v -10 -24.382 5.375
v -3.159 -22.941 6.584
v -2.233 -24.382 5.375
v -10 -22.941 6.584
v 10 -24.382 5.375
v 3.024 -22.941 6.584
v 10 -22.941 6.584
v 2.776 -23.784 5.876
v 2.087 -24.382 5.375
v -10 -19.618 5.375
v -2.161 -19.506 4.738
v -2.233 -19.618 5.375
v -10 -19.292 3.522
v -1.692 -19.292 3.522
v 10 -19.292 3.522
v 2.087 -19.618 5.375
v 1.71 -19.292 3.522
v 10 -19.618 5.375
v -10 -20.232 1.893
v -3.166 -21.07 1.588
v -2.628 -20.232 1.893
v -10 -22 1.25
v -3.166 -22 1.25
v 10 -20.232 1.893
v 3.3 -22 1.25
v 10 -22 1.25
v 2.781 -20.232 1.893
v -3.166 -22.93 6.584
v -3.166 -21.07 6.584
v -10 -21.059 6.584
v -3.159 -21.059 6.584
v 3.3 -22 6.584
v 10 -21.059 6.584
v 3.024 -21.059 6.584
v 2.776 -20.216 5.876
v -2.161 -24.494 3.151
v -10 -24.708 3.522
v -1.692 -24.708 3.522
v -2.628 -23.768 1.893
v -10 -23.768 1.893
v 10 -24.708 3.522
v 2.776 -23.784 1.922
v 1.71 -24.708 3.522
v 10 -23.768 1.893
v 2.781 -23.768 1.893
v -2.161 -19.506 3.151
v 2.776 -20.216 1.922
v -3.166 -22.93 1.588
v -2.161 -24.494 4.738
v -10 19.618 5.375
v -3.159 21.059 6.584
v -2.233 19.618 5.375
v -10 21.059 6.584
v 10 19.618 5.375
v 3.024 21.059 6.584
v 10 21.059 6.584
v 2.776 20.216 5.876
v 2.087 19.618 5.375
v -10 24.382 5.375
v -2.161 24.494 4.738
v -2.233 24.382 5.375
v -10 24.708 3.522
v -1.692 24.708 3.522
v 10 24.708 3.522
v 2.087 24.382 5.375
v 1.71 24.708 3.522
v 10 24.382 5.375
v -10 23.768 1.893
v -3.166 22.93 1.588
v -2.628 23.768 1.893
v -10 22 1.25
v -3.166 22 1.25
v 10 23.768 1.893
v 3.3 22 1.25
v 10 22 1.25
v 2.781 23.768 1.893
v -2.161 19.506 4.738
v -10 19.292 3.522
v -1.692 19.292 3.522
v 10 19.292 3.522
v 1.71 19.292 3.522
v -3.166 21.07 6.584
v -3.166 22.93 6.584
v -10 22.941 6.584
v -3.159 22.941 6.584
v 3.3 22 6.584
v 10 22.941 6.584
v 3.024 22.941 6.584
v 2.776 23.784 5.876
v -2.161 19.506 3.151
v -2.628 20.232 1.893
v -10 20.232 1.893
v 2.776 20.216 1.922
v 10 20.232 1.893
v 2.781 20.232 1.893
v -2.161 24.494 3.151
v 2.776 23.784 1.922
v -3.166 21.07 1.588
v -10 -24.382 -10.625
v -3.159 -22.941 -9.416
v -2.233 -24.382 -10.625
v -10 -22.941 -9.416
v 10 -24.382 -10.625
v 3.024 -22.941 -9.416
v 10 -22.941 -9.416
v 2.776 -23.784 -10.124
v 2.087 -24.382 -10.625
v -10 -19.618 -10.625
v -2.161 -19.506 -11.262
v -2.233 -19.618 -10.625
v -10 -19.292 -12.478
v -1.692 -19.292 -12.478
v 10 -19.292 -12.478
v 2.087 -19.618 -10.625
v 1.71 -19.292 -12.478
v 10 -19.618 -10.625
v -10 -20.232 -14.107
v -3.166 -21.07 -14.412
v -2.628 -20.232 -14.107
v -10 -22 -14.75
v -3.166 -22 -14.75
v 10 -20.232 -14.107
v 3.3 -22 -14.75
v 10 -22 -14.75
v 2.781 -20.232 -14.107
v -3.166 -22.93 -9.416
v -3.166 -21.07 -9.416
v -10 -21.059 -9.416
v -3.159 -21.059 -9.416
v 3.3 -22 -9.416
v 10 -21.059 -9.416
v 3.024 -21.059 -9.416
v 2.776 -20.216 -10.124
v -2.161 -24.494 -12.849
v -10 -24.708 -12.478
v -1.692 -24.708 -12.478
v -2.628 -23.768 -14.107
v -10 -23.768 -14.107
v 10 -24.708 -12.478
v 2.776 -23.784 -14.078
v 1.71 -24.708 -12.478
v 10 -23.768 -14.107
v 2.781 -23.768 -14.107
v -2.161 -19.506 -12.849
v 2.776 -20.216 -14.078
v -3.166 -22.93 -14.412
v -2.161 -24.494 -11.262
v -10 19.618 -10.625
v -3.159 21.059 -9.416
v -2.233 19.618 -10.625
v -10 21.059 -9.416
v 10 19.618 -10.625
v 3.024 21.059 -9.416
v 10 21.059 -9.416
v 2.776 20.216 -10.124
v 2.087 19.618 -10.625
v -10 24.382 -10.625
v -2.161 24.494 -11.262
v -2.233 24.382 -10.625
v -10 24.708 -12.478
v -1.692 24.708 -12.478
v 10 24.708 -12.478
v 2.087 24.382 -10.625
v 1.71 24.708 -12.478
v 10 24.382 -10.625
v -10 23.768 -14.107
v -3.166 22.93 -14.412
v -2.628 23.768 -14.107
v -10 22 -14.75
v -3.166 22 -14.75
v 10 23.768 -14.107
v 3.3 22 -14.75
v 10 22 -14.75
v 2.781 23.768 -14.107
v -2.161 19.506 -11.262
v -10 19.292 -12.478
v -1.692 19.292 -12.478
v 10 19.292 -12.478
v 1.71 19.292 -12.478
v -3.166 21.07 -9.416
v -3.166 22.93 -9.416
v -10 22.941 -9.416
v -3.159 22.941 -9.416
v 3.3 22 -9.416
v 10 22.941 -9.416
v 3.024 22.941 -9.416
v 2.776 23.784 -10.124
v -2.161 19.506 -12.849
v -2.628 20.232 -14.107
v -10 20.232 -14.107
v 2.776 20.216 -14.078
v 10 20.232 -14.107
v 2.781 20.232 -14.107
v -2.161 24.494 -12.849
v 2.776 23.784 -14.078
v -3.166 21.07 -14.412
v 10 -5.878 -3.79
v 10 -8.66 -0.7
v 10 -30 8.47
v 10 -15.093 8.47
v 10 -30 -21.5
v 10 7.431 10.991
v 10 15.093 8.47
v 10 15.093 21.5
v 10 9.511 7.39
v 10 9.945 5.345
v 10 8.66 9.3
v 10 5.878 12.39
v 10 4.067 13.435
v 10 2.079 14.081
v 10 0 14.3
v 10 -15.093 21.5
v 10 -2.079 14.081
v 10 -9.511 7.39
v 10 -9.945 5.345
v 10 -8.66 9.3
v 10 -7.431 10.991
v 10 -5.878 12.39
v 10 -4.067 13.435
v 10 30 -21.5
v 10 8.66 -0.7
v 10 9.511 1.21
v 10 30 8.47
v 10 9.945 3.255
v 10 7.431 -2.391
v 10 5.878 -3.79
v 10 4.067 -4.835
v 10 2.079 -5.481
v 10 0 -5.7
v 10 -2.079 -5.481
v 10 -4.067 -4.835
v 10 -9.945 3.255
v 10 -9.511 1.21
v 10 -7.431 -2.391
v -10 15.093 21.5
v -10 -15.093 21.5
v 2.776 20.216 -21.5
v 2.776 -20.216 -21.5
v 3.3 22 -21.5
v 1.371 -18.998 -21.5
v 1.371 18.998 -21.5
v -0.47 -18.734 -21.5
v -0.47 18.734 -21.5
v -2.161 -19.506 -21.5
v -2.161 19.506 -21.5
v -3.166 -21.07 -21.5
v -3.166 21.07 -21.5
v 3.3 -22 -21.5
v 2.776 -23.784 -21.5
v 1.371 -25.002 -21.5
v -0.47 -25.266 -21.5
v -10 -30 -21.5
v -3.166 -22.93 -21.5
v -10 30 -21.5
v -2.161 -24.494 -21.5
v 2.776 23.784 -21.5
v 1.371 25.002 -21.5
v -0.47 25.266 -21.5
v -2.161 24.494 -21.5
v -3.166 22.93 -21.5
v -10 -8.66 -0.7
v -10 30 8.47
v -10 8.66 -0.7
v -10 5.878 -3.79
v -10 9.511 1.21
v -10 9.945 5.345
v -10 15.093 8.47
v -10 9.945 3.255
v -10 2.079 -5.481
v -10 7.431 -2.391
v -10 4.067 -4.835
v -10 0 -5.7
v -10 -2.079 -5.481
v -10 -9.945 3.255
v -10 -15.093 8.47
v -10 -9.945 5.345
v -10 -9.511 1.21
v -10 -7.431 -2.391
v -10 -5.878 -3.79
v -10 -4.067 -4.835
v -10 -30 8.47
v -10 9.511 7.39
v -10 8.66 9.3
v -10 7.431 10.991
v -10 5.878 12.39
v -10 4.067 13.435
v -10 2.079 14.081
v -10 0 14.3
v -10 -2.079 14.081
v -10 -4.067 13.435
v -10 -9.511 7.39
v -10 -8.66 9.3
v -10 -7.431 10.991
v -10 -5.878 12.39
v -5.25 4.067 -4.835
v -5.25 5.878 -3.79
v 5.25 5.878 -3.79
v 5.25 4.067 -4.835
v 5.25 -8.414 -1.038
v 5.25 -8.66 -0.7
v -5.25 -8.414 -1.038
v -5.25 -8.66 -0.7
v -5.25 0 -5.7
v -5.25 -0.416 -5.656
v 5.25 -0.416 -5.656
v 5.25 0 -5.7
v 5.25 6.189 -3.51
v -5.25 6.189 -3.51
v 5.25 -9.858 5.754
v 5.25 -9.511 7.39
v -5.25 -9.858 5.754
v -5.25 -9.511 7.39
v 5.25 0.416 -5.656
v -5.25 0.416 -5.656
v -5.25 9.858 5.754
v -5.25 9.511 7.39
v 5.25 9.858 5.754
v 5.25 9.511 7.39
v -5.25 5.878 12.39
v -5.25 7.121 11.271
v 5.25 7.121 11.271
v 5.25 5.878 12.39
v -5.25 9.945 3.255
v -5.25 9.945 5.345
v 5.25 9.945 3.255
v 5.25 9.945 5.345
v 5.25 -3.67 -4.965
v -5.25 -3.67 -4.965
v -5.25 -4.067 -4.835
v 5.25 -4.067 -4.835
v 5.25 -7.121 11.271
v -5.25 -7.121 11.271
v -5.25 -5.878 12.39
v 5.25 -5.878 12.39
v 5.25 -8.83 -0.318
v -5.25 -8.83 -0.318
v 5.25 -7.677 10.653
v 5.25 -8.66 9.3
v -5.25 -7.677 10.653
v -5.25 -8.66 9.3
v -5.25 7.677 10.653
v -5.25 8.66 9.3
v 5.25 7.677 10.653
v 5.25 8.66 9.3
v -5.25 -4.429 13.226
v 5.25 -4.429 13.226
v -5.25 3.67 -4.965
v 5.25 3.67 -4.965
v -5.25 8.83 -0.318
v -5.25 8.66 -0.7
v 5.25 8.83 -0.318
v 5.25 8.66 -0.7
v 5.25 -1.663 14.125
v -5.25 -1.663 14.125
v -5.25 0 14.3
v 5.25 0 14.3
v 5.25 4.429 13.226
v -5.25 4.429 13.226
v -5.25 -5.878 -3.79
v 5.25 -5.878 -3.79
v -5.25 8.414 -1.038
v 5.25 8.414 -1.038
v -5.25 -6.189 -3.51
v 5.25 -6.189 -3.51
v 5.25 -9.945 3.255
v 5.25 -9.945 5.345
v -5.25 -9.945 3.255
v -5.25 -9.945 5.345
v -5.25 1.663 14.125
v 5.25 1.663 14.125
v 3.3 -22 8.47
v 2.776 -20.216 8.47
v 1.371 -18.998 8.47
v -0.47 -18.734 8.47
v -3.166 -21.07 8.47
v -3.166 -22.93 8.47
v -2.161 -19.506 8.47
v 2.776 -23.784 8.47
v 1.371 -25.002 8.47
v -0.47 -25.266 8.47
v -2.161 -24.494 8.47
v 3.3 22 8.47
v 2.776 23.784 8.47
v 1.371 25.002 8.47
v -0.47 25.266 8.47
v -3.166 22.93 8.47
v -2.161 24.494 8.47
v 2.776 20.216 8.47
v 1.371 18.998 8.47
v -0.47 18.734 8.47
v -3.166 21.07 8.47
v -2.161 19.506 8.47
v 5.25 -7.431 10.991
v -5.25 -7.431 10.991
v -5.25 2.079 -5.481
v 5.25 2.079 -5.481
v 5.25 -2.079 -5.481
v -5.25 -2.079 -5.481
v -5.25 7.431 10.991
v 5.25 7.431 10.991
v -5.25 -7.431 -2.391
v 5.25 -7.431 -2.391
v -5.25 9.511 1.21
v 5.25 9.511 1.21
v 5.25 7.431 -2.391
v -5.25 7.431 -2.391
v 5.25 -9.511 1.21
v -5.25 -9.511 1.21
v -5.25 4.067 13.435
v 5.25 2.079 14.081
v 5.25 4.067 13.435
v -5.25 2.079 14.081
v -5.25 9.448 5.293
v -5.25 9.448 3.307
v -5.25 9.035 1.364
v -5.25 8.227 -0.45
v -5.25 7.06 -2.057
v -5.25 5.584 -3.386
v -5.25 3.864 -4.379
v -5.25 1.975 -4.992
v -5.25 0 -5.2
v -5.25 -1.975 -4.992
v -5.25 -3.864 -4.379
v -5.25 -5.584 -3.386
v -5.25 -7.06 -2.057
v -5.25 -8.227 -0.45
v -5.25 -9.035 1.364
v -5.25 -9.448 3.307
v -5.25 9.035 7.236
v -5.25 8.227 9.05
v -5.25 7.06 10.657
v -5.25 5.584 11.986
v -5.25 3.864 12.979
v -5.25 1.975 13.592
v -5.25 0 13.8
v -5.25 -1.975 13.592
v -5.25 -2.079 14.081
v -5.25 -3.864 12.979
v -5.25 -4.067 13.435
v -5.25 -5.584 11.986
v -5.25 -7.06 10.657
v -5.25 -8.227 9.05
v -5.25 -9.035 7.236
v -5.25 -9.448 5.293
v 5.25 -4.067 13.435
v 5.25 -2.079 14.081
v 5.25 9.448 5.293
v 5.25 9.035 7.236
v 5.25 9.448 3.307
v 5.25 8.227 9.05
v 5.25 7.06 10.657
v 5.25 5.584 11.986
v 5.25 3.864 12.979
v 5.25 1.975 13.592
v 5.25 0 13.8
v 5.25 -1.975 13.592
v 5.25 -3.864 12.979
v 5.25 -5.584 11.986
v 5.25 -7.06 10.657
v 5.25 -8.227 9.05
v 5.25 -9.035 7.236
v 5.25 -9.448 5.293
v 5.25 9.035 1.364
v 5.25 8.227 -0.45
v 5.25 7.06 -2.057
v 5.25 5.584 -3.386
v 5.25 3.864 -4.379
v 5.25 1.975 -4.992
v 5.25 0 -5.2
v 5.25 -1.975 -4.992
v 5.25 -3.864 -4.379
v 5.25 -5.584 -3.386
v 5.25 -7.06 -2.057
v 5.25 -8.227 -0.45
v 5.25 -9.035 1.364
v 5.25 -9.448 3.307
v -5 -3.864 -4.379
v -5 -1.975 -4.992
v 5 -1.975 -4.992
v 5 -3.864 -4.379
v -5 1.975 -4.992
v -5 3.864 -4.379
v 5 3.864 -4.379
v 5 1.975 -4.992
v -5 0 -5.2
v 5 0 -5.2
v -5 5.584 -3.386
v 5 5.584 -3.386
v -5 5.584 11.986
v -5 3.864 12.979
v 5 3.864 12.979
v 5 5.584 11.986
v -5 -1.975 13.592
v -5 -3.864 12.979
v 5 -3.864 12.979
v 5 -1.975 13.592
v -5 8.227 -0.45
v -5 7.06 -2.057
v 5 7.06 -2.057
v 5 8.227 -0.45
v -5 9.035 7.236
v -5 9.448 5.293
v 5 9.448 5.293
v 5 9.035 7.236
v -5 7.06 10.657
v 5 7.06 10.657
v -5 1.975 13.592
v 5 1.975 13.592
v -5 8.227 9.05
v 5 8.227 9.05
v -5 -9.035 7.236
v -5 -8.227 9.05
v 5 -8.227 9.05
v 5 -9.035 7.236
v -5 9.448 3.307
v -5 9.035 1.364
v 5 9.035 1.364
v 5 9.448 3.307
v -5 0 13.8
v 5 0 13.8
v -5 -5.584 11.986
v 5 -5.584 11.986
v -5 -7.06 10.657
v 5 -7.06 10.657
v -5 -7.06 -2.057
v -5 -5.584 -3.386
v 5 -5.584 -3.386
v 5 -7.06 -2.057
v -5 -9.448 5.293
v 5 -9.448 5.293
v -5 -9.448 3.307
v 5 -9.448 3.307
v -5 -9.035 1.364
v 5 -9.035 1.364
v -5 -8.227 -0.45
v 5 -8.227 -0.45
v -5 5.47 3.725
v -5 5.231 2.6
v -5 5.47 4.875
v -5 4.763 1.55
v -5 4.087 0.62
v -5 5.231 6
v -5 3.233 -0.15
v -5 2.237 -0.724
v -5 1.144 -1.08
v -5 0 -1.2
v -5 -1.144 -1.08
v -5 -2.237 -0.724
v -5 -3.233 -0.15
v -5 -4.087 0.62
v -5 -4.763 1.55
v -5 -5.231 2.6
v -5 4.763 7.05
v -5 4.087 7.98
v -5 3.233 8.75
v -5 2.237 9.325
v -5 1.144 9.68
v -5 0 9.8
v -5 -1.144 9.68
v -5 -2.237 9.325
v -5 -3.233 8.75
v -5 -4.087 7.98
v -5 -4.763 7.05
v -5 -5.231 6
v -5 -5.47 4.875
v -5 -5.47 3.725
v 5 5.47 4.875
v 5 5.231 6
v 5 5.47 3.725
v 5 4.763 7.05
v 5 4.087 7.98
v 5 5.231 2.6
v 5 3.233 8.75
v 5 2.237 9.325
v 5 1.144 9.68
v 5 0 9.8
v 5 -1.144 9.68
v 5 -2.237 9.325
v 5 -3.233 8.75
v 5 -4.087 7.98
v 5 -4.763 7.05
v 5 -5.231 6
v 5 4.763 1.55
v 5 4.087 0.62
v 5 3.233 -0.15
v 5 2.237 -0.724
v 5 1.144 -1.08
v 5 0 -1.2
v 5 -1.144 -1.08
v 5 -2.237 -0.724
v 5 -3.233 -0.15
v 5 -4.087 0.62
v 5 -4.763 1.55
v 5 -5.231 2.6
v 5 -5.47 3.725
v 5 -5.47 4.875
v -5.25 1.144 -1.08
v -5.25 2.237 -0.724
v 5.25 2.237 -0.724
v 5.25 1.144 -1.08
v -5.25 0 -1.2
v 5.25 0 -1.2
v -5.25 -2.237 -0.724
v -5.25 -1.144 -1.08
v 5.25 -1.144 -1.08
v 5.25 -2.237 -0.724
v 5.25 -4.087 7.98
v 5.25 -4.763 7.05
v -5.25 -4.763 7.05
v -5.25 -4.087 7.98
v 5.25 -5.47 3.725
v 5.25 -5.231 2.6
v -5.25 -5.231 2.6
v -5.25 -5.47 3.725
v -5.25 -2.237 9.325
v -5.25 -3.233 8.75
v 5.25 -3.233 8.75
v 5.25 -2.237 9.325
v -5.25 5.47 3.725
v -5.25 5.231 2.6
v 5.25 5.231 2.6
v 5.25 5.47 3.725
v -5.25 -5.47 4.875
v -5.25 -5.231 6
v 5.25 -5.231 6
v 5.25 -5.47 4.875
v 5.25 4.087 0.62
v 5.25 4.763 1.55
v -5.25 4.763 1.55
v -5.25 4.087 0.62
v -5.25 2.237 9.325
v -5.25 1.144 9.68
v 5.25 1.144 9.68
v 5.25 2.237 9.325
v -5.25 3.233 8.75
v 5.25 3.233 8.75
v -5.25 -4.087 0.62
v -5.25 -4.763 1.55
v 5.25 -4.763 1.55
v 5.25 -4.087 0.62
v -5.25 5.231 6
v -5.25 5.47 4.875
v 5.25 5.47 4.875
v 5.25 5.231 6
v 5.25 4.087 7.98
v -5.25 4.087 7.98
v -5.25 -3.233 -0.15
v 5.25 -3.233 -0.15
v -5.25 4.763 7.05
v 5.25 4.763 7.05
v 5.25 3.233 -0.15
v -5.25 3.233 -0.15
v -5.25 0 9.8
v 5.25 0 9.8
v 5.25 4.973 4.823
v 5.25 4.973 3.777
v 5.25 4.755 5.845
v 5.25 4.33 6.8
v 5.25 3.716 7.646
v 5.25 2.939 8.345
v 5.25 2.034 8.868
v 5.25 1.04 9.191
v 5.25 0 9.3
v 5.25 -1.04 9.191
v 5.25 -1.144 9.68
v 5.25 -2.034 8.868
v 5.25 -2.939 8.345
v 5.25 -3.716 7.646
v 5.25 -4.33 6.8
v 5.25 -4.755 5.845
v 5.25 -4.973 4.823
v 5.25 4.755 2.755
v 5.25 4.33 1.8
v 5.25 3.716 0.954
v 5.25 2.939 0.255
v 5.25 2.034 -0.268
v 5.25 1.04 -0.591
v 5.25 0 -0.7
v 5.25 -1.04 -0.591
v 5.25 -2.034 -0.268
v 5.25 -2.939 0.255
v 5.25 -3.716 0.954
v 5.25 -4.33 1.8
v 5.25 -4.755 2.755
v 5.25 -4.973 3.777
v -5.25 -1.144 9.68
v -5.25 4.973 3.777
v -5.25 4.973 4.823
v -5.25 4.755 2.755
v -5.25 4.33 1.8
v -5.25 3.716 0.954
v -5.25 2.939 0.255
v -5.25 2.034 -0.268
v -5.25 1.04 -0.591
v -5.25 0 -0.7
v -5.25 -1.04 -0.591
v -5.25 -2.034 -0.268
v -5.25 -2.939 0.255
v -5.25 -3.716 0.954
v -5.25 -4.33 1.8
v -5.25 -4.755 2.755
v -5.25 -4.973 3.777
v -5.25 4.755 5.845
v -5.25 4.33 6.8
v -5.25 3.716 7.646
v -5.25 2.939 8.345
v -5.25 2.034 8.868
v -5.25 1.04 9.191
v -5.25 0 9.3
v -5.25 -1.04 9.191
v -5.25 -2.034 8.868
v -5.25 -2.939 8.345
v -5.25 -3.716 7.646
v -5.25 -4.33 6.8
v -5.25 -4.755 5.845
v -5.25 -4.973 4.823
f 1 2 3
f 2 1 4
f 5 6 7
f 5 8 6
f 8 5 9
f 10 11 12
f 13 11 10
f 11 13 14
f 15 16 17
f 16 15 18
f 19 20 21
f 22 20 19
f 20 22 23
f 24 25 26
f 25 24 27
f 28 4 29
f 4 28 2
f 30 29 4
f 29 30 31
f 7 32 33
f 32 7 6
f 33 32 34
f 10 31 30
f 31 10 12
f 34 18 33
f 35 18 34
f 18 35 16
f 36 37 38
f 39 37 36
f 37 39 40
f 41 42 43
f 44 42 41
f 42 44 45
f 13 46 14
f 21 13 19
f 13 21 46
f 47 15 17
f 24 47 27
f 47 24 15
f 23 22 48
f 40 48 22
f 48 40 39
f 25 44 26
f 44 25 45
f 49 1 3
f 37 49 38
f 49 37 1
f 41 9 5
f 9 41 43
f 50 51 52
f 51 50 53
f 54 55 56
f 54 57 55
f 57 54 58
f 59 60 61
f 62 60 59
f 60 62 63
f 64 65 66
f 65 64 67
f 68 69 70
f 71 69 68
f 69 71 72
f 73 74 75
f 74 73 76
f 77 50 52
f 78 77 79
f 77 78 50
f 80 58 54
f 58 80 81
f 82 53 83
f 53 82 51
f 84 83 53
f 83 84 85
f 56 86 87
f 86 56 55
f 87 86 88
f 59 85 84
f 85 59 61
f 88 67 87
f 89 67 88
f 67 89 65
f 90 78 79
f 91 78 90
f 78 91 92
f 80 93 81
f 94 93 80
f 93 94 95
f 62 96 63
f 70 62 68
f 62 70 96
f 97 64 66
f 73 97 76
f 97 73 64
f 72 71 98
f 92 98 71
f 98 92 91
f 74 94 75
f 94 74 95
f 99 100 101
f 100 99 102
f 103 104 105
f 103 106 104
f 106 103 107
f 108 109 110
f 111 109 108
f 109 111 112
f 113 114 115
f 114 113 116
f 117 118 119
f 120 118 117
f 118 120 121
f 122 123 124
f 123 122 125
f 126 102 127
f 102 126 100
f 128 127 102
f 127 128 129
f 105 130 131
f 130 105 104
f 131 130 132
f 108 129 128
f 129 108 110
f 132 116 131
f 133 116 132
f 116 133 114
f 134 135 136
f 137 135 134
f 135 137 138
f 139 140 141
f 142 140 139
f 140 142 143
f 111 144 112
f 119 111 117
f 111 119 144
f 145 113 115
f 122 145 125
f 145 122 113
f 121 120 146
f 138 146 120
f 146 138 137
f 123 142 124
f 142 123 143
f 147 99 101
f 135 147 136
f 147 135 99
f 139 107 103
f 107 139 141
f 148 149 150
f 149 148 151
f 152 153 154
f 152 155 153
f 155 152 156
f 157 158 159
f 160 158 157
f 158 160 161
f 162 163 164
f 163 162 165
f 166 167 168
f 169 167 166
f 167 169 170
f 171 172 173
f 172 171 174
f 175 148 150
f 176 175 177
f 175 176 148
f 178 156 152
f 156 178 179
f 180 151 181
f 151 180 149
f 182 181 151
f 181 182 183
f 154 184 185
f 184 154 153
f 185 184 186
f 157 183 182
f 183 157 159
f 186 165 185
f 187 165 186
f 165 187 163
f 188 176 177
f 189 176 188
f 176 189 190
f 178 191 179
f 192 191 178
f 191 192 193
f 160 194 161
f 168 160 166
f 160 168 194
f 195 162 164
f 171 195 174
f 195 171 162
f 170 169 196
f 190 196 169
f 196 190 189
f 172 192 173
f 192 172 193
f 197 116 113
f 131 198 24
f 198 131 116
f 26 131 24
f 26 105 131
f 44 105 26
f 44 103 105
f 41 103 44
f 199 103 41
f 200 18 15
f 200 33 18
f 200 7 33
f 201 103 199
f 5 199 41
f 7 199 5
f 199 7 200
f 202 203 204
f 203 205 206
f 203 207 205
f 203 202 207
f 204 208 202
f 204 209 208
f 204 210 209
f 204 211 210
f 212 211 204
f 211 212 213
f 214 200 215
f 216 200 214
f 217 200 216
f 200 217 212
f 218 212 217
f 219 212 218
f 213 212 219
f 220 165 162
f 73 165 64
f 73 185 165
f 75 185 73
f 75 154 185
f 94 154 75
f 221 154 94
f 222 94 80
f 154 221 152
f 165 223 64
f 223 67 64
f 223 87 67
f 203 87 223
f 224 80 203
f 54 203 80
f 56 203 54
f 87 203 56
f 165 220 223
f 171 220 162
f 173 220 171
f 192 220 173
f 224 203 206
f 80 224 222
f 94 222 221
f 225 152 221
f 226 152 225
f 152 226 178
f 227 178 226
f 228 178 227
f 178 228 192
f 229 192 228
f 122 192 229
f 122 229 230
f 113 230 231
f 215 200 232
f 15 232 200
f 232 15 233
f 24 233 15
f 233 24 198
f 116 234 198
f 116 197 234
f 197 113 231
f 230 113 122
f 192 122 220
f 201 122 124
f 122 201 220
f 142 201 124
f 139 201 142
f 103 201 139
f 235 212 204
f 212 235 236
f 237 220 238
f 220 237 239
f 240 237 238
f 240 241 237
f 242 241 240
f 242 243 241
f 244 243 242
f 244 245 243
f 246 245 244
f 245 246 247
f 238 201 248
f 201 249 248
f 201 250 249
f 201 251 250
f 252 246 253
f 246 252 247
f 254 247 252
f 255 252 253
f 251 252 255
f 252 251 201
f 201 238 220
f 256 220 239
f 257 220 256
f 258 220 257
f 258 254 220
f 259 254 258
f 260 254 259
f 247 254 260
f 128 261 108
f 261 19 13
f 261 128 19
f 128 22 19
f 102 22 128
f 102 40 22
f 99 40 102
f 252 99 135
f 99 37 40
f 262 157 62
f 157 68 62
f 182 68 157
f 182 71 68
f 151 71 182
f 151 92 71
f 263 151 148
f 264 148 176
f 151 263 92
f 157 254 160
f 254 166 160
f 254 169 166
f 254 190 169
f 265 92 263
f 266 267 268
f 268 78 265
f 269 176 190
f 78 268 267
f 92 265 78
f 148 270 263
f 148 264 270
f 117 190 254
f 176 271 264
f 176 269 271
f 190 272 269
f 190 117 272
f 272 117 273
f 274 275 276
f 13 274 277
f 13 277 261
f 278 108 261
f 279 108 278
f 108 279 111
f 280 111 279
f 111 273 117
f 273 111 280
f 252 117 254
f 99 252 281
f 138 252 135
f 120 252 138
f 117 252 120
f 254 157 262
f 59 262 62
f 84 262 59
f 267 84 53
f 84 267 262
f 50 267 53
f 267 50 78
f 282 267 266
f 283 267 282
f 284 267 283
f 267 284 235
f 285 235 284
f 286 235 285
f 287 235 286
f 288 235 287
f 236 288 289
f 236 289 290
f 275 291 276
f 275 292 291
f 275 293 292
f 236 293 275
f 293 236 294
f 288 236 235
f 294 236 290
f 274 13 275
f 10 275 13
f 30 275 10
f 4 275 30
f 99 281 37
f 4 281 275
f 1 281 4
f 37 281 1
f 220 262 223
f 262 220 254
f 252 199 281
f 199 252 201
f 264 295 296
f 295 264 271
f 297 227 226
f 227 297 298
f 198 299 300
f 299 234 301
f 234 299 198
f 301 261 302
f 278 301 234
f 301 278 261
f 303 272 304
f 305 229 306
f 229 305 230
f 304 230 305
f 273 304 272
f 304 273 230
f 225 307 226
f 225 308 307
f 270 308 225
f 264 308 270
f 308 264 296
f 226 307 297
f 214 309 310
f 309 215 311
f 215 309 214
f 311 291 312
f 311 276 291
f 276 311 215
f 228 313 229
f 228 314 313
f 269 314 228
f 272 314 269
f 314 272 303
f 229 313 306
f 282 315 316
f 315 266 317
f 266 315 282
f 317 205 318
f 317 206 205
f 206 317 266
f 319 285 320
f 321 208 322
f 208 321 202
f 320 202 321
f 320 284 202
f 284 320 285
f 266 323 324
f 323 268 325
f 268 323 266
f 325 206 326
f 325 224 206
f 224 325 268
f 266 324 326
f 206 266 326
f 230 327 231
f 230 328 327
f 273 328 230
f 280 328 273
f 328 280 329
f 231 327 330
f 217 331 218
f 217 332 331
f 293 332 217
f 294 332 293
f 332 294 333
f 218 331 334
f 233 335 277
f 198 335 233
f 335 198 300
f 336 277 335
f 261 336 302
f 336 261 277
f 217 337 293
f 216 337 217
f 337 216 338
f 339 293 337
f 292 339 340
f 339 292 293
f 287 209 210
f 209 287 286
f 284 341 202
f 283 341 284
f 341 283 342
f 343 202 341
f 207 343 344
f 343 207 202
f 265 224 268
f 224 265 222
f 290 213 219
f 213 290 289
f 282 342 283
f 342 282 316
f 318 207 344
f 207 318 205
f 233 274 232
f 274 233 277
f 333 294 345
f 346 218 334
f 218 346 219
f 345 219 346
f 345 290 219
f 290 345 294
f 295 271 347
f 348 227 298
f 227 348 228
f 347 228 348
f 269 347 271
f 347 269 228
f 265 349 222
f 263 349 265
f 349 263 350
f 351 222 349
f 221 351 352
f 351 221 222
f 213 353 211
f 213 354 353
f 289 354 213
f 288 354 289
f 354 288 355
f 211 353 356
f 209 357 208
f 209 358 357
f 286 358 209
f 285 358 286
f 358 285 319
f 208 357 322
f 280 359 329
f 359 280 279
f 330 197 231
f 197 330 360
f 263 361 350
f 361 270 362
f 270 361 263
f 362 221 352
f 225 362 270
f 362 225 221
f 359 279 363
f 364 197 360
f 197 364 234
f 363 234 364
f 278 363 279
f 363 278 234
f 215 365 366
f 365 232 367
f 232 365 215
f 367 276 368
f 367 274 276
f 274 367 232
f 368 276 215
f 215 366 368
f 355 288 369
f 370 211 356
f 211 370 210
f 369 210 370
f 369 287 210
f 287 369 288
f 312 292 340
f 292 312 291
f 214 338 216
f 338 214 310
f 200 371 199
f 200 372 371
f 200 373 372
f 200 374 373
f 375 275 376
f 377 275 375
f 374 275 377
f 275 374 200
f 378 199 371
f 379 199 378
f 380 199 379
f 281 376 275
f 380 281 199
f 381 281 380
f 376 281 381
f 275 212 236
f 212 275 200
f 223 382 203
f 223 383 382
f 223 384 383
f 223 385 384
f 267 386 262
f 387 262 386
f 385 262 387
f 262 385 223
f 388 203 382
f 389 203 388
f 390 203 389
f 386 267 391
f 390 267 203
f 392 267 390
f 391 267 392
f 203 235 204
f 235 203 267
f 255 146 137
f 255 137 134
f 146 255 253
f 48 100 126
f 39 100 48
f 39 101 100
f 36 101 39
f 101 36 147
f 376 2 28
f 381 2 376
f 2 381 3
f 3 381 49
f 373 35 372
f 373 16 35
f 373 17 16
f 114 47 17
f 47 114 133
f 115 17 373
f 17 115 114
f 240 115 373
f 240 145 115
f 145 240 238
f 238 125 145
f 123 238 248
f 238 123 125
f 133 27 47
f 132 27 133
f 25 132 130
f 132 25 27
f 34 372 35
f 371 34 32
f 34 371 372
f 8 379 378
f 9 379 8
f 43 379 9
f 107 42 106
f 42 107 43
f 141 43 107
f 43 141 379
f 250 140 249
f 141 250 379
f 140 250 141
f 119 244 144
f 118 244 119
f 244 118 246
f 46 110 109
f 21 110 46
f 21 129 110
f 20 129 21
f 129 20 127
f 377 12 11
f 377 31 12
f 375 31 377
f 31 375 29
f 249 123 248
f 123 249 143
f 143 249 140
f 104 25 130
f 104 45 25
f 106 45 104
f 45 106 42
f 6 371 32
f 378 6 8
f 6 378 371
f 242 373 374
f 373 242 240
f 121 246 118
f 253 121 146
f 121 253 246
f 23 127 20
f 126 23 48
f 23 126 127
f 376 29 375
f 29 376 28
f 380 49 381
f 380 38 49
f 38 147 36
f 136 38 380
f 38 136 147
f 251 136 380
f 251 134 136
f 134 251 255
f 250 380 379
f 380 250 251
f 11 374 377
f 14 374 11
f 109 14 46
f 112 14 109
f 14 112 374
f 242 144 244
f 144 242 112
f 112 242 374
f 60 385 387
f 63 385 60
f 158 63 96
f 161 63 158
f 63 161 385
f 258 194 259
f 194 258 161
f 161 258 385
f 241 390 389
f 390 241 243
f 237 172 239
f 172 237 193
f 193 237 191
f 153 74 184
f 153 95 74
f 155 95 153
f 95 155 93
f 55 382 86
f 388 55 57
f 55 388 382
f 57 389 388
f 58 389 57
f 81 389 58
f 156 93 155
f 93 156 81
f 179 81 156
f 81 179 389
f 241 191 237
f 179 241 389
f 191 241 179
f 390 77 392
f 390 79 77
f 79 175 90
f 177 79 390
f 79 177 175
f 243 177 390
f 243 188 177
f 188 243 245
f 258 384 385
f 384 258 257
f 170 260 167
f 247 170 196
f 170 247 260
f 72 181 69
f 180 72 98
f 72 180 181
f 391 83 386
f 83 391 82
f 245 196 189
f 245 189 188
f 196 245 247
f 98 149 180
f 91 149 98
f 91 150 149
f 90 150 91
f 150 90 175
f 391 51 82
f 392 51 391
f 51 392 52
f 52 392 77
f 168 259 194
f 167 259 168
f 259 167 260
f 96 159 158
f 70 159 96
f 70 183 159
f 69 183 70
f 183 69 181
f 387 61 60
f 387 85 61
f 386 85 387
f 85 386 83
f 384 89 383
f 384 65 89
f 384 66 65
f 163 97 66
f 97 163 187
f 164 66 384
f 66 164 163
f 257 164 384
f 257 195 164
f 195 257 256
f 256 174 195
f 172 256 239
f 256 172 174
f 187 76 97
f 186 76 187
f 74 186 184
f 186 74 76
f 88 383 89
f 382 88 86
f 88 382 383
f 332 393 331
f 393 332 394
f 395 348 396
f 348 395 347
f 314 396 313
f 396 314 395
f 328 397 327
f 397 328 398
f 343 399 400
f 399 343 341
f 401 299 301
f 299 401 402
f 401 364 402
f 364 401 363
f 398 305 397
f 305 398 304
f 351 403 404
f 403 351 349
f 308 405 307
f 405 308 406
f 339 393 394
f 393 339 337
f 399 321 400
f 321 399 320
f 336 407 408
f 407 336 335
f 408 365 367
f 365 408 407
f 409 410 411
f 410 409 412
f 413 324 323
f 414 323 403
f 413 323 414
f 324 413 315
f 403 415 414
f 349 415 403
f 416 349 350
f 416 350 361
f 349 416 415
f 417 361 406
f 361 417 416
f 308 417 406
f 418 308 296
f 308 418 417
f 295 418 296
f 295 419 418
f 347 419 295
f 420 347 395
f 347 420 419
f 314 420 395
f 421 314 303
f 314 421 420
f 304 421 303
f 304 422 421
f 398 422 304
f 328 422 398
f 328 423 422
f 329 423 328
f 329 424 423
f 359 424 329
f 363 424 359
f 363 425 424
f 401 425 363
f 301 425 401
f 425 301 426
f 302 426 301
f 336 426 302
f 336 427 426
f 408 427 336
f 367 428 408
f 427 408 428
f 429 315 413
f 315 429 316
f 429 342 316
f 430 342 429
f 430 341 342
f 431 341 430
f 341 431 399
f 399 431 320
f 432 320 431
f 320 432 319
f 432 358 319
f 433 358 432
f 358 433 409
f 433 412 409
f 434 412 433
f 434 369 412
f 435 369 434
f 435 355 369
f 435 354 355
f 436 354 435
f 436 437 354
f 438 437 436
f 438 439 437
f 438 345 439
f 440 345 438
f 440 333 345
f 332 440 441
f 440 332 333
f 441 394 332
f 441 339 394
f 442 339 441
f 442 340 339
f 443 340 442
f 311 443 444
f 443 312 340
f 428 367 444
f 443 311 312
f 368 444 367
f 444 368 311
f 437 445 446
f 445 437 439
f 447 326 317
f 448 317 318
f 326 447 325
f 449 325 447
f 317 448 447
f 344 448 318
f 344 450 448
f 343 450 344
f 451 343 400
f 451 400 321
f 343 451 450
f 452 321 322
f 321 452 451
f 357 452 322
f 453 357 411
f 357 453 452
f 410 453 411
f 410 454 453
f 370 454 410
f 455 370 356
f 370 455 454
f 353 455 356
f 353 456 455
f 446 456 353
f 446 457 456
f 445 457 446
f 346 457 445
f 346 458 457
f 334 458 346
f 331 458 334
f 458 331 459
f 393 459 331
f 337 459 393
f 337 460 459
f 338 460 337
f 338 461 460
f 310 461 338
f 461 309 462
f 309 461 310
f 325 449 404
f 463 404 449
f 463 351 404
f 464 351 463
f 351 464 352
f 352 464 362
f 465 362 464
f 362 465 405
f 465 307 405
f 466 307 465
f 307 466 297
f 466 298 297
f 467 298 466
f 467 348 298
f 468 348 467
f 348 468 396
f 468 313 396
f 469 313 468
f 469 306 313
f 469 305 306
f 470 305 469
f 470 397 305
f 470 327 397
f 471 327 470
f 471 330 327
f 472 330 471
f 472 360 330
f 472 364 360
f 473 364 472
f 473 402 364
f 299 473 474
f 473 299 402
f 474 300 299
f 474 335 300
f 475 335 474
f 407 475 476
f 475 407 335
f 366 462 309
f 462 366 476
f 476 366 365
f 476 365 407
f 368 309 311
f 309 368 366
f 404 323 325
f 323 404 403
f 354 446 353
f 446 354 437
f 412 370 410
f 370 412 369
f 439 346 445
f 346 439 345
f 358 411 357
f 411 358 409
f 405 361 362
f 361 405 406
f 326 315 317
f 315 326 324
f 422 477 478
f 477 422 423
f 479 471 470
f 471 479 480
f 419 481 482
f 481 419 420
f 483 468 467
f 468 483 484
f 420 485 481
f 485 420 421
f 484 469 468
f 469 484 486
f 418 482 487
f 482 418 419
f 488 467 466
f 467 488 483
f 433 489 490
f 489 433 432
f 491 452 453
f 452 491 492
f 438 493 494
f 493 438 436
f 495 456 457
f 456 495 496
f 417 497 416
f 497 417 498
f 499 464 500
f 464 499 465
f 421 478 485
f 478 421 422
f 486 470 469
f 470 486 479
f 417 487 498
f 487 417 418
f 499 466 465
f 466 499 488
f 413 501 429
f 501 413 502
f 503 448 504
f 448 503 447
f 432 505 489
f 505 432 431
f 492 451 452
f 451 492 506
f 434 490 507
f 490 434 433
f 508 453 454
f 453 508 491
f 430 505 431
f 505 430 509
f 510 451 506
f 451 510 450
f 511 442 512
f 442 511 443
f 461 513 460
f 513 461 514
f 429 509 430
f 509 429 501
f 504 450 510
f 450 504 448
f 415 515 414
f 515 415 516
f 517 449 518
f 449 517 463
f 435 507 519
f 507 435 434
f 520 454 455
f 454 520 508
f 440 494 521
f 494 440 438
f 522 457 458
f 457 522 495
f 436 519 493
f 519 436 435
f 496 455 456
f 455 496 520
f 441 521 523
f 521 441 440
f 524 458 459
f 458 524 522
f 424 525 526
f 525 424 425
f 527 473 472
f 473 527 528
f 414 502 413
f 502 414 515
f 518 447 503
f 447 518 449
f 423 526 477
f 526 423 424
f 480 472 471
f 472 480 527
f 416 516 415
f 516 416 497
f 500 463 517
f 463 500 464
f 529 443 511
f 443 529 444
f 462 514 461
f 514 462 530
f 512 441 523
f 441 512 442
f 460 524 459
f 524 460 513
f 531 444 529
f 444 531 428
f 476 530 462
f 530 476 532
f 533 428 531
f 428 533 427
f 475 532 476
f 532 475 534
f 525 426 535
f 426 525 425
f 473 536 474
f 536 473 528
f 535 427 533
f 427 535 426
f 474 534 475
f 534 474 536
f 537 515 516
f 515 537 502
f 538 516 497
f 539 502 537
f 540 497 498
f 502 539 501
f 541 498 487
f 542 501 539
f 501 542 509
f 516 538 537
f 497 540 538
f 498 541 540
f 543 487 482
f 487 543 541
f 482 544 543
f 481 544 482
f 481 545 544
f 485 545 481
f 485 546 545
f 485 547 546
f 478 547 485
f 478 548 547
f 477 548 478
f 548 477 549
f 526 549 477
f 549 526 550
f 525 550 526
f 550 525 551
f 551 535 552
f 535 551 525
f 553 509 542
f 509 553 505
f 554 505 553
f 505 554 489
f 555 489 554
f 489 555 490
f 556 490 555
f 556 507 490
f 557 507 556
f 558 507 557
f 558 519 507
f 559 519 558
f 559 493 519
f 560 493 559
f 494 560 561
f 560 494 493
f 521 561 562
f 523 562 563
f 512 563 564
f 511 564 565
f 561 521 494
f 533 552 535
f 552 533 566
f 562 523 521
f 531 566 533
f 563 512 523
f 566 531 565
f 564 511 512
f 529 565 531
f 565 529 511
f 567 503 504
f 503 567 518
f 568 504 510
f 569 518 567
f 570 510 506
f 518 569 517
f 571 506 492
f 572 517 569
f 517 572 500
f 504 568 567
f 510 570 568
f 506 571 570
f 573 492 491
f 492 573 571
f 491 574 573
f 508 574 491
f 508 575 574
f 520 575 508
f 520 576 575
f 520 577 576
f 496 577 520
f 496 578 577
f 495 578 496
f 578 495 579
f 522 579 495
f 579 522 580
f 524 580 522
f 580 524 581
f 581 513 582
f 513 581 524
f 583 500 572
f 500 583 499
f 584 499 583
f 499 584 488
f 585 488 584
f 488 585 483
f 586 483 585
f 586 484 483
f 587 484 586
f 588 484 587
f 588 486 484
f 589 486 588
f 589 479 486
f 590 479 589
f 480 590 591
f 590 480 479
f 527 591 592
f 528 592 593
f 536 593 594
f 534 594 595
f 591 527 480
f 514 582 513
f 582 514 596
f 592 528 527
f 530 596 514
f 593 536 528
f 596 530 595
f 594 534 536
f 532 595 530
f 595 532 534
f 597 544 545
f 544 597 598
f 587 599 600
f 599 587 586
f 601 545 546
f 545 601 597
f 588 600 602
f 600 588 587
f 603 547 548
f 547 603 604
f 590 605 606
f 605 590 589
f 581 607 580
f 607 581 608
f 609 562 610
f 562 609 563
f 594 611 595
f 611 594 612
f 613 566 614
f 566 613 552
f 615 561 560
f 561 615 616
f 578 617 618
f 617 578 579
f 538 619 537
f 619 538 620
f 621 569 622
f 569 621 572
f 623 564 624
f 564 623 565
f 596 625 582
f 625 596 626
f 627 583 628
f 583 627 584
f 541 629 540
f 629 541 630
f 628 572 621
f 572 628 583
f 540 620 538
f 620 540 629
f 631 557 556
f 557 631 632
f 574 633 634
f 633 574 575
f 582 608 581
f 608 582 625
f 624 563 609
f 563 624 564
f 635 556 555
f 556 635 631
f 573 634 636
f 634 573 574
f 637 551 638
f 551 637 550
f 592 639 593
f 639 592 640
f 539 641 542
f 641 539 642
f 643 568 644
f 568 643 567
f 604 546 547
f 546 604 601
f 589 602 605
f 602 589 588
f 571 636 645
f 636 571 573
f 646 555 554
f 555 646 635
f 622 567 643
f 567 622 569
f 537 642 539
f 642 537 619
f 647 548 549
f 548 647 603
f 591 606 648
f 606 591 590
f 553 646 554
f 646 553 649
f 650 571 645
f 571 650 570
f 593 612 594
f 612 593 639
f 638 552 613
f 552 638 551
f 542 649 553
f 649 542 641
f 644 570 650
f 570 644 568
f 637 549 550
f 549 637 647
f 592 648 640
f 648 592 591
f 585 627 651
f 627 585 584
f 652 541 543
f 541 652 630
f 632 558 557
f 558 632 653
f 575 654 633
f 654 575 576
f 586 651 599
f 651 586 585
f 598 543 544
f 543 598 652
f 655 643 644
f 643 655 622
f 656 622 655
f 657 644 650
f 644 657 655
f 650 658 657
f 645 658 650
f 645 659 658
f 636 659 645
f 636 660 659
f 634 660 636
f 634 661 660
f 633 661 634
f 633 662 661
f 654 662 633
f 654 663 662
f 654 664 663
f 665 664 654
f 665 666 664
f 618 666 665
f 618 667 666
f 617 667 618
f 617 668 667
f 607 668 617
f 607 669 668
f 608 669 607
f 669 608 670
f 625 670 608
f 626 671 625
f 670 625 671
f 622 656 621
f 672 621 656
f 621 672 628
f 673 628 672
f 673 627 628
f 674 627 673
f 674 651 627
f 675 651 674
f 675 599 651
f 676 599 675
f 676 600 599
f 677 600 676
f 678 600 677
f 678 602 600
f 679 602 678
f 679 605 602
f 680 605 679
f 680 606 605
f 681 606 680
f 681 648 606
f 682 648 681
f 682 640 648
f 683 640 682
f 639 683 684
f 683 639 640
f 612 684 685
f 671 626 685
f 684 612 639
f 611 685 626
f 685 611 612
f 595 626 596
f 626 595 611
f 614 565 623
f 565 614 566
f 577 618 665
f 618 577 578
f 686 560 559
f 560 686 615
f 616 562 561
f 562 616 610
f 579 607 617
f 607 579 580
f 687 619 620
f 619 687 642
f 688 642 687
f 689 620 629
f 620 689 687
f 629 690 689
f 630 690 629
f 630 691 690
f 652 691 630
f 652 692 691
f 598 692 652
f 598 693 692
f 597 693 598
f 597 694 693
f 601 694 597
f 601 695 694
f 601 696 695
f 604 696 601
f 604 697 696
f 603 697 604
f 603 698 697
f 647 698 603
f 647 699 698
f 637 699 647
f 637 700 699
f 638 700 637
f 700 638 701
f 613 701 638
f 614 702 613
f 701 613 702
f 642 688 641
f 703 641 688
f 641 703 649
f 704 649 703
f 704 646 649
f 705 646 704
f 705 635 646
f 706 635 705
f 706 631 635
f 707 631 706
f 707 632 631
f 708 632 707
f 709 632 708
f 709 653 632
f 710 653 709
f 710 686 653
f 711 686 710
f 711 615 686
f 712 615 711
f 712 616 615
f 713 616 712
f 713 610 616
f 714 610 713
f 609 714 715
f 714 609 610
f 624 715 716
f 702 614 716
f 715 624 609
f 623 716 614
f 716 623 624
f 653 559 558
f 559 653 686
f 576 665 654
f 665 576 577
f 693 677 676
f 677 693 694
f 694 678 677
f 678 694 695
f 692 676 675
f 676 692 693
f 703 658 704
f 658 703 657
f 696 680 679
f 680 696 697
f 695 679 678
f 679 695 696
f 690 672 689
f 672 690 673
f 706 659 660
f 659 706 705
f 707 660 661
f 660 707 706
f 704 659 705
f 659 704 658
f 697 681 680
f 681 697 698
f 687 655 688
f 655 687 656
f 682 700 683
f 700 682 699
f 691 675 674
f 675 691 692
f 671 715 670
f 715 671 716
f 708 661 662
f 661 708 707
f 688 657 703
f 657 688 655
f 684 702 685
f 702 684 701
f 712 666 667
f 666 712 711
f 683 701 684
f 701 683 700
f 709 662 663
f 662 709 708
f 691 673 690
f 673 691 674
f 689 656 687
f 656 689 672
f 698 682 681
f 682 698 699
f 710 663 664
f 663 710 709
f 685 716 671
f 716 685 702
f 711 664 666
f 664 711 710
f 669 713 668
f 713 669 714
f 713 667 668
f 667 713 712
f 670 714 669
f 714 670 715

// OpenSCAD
// file: ballBearing.scad
module ballbearing(id, od, width) {
    difference() {
        union() {
            difference() {
                color("lightgrey") cylinder(d=od, h=width+.5, center=true);
                color("lightgrey") cylinder(d=od-1, h=width+2, center=true);
            }
            color("black") cylinder(d=od-1, h=width, center=true);
            color("lightgrey") cylinder(d=id+1, h=width+.5, center=true);
        }
        
        color("lightgrey") cylinder(d=id, h=width*2, center=true);
    }
    
}

$fn=30;
ballbearing(3,8,2.5);
// main file
use <ballBearing.scad>;

module ballscrewMount(depth=20, height=43, width=60, outerhole=20, innerhole=10) {
    difference() {
        cube([depth, width, height], center=true);
        translate([0,0,height/10]) rotate([0,90, 0]) cylinder(d=outerhole, h=depth*2, center=true);
        translate([0, -width/2+(width/8.1), height/2.75]) cube([depth+1, width/4, height/3], center=true);
        translate([0, width/2-(width/8.1), height/2.75]) cube([depth+1, width/4, height/3], center=true);
        for (x = [-4,12])
            for (y = [-22,22])
                rotate([0,90,0]) translate([x,y,0]) cylinder(d=5.5, h=depth+1, center=true);
        translate([0,-width/2+8,0]) cylinder(d=6.6, h=height+1, center=true);
        mirror([0,1,0]) translate([0,-width/2+8,0]) cylinder(d=6.6, h=height+1, center=true);
    }
    translate([0,0,height/10]) rotate([0,90,0]) ballbearing(innerhole, outerhole, depth/2);
}

ballscrewMount();
